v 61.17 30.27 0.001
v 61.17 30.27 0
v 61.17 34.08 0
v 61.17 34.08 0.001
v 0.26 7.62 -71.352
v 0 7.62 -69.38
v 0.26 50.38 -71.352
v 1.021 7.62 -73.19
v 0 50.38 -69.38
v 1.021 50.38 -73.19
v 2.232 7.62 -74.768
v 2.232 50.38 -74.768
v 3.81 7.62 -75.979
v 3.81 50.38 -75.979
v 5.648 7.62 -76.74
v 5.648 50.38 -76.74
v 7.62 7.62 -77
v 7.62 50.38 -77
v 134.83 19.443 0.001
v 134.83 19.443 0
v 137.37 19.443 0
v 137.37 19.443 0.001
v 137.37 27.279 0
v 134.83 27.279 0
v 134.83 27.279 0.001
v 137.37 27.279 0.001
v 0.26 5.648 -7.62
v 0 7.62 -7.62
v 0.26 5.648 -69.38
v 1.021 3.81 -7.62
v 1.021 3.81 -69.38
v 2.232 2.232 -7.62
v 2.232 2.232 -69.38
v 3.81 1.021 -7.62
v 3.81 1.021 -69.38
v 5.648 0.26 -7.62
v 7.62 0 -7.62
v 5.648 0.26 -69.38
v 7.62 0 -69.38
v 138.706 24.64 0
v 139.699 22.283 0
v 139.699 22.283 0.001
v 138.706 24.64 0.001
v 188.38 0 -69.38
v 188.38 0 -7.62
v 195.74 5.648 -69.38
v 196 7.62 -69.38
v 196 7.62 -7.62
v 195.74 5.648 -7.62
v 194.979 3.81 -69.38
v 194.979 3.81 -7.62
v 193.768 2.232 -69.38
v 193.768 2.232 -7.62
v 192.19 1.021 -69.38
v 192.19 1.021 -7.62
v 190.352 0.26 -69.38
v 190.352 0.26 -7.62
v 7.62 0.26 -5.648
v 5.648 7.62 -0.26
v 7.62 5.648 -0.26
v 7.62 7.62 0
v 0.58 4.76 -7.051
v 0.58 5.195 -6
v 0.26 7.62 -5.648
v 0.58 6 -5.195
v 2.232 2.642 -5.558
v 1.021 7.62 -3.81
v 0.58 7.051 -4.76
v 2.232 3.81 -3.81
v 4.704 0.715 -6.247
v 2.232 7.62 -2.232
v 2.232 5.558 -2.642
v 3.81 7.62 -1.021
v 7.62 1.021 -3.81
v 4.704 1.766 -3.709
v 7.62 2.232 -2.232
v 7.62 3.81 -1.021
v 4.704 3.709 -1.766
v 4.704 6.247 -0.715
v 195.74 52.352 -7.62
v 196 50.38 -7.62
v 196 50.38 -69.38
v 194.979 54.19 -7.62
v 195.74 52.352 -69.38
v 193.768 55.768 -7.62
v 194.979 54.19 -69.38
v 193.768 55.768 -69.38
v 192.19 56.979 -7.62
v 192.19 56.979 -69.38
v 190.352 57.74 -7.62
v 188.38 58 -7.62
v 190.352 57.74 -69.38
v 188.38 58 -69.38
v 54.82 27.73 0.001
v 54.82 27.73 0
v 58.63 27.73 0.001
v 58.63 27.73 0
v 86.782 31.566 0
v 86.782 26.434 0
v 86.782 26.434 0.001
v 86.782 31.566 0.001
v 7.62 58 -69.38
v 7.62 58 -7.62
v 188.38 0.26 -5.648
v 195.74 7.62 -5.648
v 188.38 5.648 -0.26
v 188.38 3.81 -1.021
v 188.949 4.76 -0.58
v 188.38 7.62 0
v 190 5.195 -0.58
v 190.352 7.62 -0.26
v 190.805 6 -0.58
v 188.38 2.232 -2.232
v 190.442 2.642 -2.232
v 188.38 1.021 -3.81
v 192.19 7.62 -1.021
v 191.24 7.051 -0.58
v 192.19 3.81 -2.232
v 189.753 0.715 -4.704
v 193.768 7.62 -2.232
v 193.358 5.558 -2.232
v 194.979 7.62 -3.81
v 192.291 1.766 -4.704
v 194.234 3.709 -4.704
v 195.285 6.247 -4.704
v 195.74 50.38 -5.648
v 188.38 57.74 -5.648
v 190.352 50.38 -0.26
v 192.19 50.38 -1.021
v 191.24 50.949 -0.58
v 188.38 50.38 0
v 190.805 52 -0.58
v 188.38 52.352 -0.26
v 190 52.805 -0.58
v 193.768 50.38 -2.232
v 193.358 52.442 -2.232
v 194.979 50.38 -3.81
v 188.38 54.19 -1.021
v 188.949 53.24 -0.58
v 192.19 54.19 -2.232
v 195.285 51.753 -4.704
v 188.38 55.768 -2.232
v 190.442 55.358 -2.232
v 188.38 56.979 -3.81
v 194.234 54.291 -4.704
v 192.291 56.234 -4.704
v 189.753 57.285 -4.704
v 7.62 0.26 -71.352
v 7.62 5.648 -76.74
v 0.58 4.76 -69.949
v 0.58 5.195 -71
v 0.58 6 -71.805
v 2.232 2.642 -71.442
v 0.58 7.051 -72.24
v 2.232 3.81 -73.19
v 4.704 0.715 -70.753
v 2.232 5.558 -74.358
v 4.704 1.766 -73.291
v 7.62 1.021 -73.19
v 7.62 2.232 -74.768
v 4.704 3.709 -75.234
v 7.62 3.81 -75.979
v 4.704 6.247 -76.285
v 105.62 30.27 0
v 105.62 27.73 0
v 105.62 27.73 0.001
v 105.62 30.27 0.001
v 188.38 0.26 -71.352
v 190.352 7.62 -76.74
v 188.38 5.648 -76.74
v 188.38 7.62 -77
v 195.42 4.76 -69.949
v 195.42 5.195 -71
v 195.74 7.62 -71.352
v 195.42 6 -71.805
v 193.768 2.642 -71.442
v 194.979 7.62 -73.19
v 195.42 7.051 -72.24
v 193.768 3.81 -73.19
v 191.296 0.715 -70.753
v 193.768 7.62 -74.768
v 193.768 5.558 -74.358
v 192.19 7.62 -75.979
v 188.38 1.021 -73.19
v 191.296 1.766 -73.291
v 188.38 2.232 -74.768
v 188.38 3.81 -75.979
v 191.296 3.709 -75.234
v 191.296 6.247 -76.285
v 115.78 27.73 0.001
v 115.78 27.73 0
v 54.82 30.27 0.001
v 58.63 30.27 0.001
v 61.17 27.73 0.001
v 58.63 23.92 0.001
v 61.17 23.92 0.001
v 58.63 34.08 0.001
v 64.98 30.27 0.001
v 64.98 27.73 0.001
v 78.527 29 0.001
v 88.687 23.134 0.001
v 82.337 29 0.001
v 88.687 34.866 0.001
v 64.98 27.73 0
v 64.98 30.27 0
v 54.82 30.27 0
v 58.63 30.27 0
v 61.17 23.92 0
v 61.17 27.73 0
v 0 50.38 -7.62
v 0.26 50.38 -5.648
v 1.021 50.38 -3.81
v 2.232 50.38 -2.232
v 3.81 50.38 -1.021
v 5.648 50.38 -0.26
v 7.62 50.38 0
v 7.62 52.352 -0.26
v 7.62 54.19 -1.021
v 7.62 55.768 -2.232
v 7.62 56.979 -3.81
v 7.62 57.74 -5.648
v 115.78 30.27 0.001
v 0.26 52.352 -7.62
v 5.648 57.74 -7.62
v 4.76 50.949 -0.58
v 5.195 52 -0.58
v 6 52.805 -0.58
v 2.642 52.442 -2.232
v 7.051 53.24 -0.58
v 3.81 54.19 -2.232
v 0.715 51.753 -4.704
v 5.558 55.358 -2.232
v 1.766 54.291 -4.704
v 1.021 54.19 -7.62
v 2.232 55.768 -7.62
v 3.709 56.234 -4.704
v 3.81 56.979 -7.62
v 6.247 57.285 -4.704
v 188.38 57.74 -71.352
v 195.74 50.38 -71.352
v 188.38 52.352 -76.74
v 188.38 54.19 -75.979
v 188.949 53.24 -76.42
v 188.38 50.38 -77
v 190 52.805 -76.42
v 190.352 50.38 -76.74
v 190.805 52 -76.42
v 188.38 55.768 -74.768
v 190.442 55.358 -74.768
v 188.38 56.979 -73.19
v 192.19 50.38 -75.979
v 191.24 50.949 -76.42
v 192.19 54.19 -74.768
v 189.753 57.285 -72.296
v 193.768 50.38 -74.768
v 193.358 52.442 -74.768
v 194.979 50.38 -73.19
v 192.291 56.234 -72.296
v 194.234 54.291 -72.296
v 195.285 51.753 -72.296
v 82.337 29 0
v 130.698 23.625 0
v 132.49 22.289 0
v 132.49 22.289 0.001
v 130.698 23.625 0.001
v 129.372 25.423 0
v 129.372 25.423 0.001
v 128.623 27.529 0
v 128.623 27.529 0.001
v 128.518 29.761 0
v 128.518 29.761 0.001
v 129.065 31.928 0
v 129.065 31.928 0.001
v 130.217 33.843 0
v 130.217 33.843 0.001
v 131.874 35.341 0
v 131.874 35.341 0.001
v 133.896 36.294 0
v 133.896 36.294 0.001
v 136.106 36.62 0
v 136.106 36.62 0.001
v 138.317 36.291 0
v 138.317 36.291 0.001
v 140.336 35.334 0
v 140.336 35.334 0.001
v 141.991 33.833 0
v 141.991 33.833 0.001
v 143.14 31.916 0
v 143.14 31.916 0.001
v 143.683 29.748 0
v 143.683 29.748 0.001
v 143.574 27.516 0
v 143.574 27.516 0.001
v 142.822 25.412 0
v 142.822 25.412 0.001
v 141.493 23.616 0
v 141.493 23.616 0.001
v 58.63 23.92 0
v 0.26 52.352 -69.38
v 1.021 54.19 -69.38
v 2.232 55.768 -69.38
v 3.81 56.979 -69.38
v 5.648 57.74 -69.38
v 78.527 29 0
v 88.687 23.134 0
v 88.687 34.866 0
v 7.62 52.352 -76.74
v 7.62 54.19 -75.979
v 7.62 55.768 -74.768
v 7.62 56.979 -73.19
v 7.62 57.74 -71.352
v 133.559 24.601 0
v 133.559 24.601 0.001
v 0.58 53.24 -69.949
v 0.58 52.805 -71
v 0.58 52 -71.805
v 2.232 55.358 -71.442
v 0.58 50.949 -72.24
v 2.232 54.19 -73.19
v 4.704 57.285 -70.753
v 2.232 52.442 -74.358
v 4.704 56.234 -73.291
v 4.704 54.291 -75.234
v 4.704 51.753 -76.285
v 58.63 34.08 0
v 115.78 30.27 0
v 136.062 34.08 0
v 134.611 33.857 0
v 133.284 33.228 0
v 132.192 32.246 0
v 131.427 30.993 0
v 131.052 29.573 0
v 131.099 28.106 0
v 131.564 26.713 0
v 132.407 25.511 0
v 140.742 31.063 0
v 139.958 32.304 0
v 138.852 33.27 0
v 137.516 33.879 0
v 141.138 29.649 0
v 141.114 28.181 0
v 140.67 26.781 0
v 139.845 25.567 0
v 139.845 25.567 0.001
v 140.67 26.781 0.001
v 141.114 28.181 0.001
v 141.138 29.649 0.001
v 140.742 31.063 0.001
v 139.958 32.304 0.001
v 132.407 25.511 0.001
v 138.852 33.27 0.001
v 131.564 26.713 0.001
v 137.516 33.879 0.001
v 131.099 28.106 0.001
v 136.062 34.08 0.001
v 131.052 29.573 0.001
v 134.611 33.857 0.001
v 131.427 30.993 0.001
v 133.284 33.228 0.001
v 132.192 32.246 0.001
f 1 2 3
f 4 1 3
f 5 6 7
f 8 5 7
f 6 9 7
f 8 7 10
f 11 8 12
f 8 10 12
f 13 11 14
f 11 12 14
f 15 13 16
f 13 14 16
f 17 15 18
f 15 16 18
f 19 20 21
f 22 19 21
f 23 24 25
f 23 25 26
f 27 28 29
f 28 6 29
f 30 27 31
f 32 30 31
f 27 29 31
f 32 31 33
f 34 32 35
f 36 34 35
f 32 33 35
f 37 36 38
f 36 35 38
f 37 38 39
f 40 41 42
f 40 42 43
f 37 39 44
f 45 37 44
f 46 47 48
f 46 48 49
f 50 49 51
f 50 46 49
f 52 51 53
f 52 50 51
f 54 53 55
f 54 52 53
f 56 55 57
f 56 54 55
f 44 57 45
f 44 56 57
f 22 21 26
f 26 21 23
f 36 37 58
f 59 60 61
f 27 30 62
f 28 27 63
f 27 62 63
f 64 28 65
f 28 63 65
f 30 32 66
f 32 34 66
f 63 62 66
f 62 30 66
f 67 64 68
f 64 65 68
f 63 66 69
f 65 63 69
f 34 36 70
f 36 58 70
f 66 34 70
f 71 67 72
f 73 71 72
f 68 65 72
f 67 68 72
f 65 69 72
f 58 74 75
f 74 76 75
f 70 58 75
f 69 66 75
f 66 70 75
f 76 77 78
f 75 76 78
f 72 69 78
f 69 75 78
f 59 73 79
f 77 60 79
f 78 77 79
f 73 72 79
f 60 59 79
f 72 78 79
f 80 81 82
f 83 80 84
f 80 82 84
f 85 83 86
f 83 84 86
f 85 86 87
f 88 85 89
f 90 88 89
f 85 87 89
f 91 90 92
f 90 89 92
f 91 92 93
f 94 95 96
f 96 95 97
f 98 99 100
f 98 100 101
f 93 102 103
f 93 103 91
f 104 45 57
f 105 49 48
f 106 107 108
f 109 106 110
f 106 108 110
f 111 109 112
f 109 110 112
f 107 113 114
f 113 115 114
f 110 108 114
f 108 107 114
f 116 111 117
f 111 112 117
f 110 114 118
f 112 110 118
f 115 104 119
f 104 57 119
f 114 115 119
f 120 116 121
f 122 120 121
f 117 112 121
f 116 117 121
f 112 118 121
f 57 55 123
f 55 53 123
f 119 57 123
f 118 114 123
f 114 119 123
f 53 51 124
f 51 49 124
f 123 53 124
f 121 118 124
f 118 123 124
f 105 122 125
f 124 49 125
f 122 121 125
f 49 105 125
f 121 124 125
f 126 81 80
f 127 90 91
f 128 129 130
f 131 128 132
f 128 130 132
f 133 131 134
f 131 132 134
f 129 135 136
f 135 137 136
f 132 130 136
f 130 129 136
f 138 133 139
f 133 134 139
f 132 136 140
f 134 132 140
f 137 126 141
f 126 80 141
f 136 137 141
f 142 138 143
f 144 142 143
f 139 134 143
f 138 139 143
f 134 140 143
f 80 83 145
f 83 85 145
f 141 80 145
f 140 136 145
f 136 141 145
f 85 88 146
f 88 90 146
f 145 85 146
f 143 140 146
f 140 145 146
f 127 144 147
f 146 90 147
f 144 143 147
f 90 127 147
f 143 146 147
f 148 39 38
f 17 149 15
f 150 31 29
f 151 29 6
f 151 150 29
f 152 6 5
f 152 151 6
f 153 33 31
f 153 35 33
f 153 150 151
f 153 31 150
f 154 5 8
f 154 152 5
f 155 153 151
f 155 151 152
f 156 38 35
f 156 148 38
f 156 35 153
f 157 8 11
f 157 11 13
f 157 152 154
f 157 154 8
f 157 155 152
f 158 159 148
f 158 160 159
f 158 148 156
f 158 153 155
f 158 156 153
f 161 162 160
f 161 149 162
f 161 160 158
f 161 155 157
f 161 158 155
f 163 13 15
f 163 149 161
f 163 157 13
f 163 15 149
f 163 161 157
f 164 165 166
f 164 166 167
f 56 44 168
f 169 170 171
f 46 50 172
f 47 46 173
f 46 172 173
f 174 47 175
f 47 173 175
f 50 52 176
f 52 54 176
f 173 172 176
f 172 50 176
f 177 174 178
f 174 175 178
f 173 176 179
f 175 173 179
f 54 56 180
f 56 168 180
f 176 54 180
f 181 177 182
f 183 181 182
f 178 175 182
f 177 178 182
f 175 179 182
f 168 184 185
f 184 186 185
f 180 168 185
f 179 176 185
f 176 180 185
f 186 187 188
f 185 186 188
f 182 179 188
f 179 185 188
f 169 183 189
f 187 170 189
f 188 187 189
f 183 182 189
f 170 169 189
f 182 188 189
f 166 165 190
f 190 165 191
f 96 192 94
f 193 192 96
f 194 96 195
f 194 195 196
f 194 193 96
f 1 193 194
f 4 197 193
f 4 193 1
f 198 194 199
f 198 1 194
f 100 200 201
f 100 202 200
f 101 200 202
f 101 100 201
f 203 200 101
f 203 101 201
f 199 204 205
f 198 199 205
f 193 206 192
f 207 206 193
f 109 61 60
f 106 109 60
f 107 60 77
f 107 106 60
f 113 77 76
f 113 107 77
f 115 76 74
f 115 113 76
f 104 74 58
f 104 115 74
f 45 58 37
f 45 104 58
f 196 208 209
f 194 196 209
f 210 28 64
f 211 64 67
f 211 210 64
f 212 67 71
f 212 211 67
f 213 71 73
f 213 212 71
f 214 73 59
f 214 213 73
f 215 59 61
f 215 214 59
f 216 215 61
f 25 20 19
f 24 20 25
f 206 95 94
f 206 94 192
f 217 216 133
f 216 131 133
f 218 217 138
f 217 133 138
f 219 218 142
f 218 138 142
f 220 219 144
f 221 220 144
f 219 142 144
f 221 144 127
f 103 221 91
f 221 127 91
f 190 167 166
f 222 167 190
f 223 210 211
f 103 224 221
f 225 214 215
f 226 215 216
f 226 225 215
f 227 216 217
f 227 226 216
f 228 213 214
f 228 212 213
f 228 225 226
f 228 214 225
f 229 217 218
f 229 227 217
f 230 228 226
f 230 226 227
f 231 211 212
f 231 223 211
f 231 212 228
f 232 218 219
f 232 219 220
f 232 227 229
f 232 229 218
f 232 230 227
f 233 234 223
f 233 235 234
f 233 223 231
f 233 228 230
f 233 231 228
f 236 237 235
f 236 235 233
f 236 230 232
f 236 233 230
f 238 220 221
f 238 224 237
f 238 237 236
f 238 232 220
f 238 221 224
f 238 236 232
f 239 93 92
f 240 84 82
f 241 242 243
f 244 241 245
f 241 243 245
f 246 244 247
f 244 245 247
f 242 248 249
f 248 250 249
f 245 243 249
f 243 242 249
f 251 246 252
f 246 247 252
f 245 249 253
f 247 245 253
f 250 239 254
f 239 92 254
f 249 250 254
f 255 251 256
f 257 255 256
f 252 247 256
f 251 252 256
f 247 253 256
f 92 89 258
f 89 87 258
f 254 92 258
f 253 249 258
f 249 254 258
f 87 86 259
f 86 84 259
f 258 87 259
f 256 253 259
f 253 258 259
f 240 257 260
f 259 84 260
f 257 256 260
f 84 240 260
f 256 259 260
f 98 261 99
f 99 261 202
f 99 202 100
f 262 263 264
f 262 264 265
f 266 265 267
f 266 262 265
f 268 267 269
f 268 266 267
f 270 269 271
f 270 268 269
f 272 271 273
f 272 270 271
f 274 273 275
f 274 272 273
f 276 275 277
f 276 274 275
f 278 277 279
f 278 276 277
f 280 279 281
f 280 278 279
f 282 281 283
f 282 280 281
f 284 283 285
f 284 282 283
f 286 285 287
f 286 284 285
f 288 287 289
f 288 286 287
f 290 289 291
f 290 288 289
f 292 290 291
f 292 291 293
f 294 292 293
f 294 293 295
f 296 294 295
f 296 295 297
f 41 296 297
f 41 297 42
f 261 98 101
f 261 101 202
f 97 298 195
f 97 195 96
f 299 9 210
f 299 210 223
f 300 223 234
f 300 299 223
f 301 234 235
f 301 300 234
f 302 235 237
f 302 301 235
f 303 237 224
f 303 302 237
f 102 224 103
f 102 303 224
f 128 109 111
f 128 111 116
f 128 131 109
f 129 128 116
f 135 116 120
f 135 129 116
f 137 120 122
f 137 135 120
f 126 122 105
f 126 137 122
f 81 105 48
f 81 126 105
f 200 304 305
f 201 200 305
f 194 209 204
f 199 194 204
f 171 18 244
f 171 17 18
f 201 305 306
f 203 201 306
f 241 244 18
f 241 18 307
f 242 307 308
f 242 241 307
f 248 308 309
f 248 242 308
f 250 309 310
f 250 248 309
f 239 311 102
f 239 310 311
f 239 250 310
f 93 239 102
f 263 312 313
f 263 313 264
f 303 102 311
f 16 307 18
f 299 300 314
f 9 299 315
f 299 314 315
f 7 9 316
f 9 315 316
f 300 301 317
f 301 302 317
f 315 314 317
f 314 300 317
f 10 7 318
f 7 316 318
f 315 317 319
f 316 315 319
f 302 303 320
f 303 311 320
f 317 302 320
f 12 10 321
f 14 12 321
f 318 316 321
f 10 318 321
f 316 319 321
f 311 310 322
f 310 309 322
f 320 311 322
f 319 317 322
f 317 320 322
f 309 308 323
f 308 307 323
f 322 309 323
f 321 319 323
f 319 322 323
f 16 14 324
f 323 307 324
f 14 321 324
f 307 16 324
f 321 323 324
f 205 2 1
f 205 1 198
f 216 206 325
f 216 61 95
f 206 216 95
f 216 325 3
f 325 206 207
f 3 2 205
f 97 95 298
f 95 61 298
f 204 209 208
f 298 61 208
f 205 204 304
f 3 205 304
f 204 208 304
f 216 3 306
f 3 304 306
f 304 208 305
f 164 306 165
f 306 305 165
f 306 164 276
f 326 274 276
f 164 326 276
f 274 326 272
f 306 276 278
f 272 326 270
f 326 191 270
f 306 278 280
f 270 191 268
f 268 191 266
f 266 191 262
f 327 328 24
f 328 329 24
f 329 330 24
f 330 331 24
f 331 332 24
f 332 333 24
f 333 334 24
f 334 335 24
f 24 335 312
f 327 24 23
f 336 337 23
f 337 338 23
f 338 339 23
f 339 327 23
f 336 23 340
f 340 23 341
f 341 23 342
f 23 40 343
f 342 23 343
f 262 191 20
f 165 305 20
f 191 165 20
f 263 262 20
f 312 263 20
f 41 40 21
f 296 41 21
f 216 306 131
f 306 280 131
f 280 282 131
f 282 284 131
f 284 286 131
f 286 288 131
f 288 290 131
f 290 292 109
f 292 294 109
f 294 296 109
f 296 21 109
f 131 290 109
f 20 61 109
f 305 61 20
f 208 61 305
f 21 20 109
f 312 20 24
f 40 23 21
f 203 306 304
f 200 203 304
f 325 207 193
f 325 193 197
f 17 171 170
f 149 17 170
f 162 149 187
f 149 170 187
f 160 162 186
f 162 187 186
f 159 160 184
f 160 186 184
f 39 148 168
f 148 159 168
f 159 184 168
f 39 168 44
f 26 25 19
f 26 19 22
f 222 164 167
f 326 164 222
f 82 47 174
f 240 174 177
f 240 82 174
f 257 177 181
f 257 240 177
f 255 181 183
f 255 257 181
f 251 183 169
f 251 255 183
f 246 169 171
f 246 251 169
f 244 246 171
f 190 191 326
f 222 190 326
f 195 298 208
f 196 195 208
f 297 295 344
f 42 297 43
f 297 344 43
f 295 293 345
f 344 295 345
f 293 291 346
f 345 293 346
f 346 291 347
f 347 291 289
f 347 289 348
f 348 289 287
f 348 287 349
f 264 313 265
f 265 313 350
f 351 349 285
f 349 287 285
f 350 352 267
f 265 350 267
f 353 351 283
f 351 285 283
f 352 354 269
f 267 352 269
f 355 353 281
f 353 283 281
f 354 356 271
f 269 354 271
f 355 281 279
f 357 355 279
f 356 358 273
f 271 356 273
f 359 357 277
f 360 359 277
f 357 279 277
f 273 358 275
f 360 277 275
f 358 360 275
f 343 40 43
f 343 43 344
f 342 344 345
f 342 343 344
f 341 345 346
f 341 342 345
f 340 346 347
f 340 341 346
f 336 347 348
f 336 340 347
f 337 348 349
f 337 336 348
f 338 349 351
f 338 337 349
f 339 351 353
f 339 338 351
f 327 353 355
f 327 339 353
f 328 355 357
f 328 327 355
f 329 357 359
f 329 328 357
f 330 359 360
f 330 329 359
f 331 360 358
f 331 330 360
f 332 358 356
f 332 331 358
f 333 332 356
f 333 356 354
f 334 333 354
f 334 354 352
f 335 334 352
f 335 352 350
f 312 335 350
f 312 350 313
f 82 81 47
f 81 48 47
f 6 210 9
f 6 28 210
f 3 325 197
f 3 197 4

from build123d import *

# Parameters (mm, degrees)
SKETCH1_W           = 196
SKETCH1_H           = 77
BOSS_EXTRUDE1_DEPTH = 58
FILLET1_R           = 7.62
SKETCH2_W           = 2.54
SKETCH2_H           = 7.836102323
SKETCH2_W_2         = 10.16
SKETCH2_H_2         = 2.54
SKETCH2_H_3         = 3.81
SKETCH2_W_3         = 3.81
BOSS_EXTRUDE2_DEPTH = 0.001


with BuildPart() as part:
    # Sketch1 → Boss-Extrude1 (new body)
    with BuildSketch(Plane(origin=(0, 0, 0), x_dir=(1, 0, 0), z_dir=(0, 1, 0))):
        with Locations((98, 38.5)):
            Rectangle(SKETCH1_W, SKETCH1_H)
    extrude(amount=BOSS_EXTRUDE1_DEPTH)

    # Fillet1
    fillet1_edges = [part.edges().sort_by_distance(p)[0] for p in [
        (196, 58, -38.5),
        (98, 58, -77),
        (0, 58, -38.5),
        (98, 0, -77),
        (196, 0, -38.5),
        (98, 0, 0),
        (0, 0, -38.5),
        (0, 29, -77),
        (196, 29, -77),
        (196, 29, 0),
        (0, 29, 0),
        (98, 58, 0),
    ]]
    fillet(fillet1_edges, radius=FILLET1_R)

    # Sketch2 → Boss-Extrude2 (add)
    # profile 1 of 9: a face of its own
    with BuildSketch(Plane.XY):
        with BuildLine():
            Line((139.698967869, 22.283465903), (138.706339513, 24.639564891))
            ThreePointArc((138.706339513, 24.639564891), (136.061823348, 34.079856548), (133.559491145, 24.600884776))
            Line((133.559491145, 24.600884776), (132.489888668, 22.289448892))
            ThreePointArc((132.489888668, 22.289448892), (136.10632402, 36.619997376), (139.698967869, 22.283465903))
        make_face()
    # profile 2 of 9: a face of its own
    with BuildSketch(Plane.XY):
        with Locations((136.1, 23.360894571)):
            Rectangle(SKETCH2_W, SKETCH2_H)
    # profile 3 of 9: a face of its own
    with BuildSketch(Plane.XY):
        with Locations((110.7, 29)):
            Rectangle(SKETCH2_W_2, SKETCH2_H_2)
    # profile 4 of 9: a face of its own
    with BuildSketch(Plane.XY):
        Polygon((88.686666667, 23.134121265), (88.686666667, 34.865878735), (78.526666667, 29), align=None)
        Polygon((82.336666667, 29), (86.781666667, 26.433678053), (86.781666667, 31.566321947), align=None, mode=Mode.SUBTRACT)
    # profile 5 of 9: a face of its own
    with BuildSketch(Plane.XY):
        with Locations((59.9, 32.175)):
            Rectangle(SKETCH2_W, SKETCH2_H_3)
    # profile 6 of 9: a face of its own
    with BuildSketch(Plane.XY):
        with Locations((63.075, 29)):
            Rectangle(SKETCH2_W_3, SKETCH2_H_2)
    # profile 7 of 9: a face of its own
    with BuildSketch(Plane.XY):
        with Locations((59.9, 29)):
            Rectangle(SKETCH2_W, SKETCH2_H_2)
    # profile 8 of 9: a face of its own
    with BuildSketch(Plane.XY):
        with Locations((59.9, 25.825)):
            Rectangle(SKETCH2_W, SKETCH2_H_3)
    # profile 9 of 9: a face of its own
    with BuildSketch(Plane.XY):
        with Locations((56.725, 29)):
            Rectangle(SKETCH2_W_3, SKETCH2_H_2)
    extrude(amount=BOSS_EXTRUDE2_DEPTH)


solid = part.part
